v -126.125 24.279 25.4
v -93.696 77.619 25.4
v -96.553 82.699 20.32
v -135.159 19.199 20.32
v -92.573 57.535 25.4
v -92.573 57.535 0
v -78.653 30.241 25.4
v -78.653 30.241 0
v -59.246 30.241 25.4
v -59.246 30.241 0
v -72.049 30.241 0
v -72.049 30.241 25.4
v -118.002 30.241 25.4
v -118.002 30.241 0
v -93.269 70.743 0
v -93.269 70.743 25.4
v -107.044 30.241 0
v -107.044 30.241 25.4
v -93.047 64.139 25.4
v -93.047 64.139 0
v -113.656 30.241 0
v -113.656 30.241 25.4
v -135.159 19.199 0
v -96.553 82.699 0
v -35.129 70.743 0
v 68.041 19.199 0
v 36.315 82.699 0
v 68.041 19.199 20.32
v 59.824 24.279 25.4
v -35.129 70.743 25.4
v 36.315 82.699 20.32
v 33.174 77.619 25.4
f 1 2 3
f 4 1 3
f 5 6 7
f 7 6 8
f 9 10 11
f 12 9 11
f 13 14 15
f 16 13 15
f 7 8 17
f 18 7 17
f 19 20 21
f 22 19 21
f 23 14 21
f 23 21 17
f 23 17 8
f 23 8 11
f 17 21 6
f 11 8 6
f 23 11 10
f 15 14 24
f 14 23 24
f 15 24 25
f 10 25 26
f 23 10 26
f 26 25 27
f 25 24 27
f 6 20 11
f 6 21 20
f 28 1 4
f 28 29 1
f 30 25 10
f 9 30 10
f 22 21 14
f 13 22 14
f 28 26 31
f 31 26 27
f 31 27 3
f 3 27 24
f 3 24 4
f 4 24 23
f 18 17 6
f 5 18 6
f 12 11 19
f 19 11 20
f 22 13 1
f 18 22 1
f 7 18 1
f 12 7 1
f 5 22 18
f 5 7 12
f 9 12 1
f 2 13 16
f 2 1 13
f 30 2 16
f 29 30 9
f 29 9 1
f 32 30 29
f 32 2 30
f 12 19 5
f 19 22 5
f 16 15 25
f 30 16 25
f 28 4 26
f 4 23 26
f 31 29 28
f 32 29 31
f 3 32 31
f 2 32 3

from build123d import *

# Parameters (mm, degrees)
F1_DEPTH = 25.4
F2_SIZE  = 5.08
F3_SIZE  = 5.08
F4_DEPTH = 25.4


with BuildPart() as f1:
    # F0 (on Top) → F1 (new body)
    with BuildSketch(Plane.XY):
        Polygon((-96.55295, 82.698783), (-135.158697, 19.198783), (68.041303, 19.198783), (36.314912, 82.698783), align=None)
        Polygon((-107.044348, 30.241039), (-113.656216, 30.241039), (-118.00166, 30.241039), (-93.268513, 70.743374), (-86.106063, 70.743374), (-79.70608, 70.743374), (-73.083729, 70.743374), (-48.325919, 70.743374), (-41.849952, 70.743374), (-35.128757, 70.743374), (-59.245978, 30.241039), (-66.7454, 30.241039), (-72.049234, 30.241039), (-78.653234, 30.241039), align=None, mode=Mode.SUBTRACT)
    extrude(amount=F1_DEPTH)

    # F2
    f2_edges = [f1.edges().sort_by_distance(p)[0] for p in [
        (-30.119019, 82.698783, 25.4),
        (-115.855824, 50.948783, 25.4),
        (52.178107, 50.948783, 25.4),
    ]]
    chamfer(f2_edges, length=F2_SIZE)

    # F3
    f3_edges = [f1.edges().sort_by_distance(p)[0] for p in [
        (-33.425499, 19.198783, 25.4),
    ]]
    chamfer(f3_edges, length=F3_SIZE)

    # F0 (on Top) → F4 (join)
    with BuildSketch(Plane.XY):
        Polygon((-72.049234, 30.241039), (-93.047231, 64.139374), (-113.656216, 30.241039), (-107.044348, 30.241039), (-92.57324, 57.535374), (-78.653234, 30.241039), align=None)
    extrude(amount=F4_DEPTH)


solid = f1.part
